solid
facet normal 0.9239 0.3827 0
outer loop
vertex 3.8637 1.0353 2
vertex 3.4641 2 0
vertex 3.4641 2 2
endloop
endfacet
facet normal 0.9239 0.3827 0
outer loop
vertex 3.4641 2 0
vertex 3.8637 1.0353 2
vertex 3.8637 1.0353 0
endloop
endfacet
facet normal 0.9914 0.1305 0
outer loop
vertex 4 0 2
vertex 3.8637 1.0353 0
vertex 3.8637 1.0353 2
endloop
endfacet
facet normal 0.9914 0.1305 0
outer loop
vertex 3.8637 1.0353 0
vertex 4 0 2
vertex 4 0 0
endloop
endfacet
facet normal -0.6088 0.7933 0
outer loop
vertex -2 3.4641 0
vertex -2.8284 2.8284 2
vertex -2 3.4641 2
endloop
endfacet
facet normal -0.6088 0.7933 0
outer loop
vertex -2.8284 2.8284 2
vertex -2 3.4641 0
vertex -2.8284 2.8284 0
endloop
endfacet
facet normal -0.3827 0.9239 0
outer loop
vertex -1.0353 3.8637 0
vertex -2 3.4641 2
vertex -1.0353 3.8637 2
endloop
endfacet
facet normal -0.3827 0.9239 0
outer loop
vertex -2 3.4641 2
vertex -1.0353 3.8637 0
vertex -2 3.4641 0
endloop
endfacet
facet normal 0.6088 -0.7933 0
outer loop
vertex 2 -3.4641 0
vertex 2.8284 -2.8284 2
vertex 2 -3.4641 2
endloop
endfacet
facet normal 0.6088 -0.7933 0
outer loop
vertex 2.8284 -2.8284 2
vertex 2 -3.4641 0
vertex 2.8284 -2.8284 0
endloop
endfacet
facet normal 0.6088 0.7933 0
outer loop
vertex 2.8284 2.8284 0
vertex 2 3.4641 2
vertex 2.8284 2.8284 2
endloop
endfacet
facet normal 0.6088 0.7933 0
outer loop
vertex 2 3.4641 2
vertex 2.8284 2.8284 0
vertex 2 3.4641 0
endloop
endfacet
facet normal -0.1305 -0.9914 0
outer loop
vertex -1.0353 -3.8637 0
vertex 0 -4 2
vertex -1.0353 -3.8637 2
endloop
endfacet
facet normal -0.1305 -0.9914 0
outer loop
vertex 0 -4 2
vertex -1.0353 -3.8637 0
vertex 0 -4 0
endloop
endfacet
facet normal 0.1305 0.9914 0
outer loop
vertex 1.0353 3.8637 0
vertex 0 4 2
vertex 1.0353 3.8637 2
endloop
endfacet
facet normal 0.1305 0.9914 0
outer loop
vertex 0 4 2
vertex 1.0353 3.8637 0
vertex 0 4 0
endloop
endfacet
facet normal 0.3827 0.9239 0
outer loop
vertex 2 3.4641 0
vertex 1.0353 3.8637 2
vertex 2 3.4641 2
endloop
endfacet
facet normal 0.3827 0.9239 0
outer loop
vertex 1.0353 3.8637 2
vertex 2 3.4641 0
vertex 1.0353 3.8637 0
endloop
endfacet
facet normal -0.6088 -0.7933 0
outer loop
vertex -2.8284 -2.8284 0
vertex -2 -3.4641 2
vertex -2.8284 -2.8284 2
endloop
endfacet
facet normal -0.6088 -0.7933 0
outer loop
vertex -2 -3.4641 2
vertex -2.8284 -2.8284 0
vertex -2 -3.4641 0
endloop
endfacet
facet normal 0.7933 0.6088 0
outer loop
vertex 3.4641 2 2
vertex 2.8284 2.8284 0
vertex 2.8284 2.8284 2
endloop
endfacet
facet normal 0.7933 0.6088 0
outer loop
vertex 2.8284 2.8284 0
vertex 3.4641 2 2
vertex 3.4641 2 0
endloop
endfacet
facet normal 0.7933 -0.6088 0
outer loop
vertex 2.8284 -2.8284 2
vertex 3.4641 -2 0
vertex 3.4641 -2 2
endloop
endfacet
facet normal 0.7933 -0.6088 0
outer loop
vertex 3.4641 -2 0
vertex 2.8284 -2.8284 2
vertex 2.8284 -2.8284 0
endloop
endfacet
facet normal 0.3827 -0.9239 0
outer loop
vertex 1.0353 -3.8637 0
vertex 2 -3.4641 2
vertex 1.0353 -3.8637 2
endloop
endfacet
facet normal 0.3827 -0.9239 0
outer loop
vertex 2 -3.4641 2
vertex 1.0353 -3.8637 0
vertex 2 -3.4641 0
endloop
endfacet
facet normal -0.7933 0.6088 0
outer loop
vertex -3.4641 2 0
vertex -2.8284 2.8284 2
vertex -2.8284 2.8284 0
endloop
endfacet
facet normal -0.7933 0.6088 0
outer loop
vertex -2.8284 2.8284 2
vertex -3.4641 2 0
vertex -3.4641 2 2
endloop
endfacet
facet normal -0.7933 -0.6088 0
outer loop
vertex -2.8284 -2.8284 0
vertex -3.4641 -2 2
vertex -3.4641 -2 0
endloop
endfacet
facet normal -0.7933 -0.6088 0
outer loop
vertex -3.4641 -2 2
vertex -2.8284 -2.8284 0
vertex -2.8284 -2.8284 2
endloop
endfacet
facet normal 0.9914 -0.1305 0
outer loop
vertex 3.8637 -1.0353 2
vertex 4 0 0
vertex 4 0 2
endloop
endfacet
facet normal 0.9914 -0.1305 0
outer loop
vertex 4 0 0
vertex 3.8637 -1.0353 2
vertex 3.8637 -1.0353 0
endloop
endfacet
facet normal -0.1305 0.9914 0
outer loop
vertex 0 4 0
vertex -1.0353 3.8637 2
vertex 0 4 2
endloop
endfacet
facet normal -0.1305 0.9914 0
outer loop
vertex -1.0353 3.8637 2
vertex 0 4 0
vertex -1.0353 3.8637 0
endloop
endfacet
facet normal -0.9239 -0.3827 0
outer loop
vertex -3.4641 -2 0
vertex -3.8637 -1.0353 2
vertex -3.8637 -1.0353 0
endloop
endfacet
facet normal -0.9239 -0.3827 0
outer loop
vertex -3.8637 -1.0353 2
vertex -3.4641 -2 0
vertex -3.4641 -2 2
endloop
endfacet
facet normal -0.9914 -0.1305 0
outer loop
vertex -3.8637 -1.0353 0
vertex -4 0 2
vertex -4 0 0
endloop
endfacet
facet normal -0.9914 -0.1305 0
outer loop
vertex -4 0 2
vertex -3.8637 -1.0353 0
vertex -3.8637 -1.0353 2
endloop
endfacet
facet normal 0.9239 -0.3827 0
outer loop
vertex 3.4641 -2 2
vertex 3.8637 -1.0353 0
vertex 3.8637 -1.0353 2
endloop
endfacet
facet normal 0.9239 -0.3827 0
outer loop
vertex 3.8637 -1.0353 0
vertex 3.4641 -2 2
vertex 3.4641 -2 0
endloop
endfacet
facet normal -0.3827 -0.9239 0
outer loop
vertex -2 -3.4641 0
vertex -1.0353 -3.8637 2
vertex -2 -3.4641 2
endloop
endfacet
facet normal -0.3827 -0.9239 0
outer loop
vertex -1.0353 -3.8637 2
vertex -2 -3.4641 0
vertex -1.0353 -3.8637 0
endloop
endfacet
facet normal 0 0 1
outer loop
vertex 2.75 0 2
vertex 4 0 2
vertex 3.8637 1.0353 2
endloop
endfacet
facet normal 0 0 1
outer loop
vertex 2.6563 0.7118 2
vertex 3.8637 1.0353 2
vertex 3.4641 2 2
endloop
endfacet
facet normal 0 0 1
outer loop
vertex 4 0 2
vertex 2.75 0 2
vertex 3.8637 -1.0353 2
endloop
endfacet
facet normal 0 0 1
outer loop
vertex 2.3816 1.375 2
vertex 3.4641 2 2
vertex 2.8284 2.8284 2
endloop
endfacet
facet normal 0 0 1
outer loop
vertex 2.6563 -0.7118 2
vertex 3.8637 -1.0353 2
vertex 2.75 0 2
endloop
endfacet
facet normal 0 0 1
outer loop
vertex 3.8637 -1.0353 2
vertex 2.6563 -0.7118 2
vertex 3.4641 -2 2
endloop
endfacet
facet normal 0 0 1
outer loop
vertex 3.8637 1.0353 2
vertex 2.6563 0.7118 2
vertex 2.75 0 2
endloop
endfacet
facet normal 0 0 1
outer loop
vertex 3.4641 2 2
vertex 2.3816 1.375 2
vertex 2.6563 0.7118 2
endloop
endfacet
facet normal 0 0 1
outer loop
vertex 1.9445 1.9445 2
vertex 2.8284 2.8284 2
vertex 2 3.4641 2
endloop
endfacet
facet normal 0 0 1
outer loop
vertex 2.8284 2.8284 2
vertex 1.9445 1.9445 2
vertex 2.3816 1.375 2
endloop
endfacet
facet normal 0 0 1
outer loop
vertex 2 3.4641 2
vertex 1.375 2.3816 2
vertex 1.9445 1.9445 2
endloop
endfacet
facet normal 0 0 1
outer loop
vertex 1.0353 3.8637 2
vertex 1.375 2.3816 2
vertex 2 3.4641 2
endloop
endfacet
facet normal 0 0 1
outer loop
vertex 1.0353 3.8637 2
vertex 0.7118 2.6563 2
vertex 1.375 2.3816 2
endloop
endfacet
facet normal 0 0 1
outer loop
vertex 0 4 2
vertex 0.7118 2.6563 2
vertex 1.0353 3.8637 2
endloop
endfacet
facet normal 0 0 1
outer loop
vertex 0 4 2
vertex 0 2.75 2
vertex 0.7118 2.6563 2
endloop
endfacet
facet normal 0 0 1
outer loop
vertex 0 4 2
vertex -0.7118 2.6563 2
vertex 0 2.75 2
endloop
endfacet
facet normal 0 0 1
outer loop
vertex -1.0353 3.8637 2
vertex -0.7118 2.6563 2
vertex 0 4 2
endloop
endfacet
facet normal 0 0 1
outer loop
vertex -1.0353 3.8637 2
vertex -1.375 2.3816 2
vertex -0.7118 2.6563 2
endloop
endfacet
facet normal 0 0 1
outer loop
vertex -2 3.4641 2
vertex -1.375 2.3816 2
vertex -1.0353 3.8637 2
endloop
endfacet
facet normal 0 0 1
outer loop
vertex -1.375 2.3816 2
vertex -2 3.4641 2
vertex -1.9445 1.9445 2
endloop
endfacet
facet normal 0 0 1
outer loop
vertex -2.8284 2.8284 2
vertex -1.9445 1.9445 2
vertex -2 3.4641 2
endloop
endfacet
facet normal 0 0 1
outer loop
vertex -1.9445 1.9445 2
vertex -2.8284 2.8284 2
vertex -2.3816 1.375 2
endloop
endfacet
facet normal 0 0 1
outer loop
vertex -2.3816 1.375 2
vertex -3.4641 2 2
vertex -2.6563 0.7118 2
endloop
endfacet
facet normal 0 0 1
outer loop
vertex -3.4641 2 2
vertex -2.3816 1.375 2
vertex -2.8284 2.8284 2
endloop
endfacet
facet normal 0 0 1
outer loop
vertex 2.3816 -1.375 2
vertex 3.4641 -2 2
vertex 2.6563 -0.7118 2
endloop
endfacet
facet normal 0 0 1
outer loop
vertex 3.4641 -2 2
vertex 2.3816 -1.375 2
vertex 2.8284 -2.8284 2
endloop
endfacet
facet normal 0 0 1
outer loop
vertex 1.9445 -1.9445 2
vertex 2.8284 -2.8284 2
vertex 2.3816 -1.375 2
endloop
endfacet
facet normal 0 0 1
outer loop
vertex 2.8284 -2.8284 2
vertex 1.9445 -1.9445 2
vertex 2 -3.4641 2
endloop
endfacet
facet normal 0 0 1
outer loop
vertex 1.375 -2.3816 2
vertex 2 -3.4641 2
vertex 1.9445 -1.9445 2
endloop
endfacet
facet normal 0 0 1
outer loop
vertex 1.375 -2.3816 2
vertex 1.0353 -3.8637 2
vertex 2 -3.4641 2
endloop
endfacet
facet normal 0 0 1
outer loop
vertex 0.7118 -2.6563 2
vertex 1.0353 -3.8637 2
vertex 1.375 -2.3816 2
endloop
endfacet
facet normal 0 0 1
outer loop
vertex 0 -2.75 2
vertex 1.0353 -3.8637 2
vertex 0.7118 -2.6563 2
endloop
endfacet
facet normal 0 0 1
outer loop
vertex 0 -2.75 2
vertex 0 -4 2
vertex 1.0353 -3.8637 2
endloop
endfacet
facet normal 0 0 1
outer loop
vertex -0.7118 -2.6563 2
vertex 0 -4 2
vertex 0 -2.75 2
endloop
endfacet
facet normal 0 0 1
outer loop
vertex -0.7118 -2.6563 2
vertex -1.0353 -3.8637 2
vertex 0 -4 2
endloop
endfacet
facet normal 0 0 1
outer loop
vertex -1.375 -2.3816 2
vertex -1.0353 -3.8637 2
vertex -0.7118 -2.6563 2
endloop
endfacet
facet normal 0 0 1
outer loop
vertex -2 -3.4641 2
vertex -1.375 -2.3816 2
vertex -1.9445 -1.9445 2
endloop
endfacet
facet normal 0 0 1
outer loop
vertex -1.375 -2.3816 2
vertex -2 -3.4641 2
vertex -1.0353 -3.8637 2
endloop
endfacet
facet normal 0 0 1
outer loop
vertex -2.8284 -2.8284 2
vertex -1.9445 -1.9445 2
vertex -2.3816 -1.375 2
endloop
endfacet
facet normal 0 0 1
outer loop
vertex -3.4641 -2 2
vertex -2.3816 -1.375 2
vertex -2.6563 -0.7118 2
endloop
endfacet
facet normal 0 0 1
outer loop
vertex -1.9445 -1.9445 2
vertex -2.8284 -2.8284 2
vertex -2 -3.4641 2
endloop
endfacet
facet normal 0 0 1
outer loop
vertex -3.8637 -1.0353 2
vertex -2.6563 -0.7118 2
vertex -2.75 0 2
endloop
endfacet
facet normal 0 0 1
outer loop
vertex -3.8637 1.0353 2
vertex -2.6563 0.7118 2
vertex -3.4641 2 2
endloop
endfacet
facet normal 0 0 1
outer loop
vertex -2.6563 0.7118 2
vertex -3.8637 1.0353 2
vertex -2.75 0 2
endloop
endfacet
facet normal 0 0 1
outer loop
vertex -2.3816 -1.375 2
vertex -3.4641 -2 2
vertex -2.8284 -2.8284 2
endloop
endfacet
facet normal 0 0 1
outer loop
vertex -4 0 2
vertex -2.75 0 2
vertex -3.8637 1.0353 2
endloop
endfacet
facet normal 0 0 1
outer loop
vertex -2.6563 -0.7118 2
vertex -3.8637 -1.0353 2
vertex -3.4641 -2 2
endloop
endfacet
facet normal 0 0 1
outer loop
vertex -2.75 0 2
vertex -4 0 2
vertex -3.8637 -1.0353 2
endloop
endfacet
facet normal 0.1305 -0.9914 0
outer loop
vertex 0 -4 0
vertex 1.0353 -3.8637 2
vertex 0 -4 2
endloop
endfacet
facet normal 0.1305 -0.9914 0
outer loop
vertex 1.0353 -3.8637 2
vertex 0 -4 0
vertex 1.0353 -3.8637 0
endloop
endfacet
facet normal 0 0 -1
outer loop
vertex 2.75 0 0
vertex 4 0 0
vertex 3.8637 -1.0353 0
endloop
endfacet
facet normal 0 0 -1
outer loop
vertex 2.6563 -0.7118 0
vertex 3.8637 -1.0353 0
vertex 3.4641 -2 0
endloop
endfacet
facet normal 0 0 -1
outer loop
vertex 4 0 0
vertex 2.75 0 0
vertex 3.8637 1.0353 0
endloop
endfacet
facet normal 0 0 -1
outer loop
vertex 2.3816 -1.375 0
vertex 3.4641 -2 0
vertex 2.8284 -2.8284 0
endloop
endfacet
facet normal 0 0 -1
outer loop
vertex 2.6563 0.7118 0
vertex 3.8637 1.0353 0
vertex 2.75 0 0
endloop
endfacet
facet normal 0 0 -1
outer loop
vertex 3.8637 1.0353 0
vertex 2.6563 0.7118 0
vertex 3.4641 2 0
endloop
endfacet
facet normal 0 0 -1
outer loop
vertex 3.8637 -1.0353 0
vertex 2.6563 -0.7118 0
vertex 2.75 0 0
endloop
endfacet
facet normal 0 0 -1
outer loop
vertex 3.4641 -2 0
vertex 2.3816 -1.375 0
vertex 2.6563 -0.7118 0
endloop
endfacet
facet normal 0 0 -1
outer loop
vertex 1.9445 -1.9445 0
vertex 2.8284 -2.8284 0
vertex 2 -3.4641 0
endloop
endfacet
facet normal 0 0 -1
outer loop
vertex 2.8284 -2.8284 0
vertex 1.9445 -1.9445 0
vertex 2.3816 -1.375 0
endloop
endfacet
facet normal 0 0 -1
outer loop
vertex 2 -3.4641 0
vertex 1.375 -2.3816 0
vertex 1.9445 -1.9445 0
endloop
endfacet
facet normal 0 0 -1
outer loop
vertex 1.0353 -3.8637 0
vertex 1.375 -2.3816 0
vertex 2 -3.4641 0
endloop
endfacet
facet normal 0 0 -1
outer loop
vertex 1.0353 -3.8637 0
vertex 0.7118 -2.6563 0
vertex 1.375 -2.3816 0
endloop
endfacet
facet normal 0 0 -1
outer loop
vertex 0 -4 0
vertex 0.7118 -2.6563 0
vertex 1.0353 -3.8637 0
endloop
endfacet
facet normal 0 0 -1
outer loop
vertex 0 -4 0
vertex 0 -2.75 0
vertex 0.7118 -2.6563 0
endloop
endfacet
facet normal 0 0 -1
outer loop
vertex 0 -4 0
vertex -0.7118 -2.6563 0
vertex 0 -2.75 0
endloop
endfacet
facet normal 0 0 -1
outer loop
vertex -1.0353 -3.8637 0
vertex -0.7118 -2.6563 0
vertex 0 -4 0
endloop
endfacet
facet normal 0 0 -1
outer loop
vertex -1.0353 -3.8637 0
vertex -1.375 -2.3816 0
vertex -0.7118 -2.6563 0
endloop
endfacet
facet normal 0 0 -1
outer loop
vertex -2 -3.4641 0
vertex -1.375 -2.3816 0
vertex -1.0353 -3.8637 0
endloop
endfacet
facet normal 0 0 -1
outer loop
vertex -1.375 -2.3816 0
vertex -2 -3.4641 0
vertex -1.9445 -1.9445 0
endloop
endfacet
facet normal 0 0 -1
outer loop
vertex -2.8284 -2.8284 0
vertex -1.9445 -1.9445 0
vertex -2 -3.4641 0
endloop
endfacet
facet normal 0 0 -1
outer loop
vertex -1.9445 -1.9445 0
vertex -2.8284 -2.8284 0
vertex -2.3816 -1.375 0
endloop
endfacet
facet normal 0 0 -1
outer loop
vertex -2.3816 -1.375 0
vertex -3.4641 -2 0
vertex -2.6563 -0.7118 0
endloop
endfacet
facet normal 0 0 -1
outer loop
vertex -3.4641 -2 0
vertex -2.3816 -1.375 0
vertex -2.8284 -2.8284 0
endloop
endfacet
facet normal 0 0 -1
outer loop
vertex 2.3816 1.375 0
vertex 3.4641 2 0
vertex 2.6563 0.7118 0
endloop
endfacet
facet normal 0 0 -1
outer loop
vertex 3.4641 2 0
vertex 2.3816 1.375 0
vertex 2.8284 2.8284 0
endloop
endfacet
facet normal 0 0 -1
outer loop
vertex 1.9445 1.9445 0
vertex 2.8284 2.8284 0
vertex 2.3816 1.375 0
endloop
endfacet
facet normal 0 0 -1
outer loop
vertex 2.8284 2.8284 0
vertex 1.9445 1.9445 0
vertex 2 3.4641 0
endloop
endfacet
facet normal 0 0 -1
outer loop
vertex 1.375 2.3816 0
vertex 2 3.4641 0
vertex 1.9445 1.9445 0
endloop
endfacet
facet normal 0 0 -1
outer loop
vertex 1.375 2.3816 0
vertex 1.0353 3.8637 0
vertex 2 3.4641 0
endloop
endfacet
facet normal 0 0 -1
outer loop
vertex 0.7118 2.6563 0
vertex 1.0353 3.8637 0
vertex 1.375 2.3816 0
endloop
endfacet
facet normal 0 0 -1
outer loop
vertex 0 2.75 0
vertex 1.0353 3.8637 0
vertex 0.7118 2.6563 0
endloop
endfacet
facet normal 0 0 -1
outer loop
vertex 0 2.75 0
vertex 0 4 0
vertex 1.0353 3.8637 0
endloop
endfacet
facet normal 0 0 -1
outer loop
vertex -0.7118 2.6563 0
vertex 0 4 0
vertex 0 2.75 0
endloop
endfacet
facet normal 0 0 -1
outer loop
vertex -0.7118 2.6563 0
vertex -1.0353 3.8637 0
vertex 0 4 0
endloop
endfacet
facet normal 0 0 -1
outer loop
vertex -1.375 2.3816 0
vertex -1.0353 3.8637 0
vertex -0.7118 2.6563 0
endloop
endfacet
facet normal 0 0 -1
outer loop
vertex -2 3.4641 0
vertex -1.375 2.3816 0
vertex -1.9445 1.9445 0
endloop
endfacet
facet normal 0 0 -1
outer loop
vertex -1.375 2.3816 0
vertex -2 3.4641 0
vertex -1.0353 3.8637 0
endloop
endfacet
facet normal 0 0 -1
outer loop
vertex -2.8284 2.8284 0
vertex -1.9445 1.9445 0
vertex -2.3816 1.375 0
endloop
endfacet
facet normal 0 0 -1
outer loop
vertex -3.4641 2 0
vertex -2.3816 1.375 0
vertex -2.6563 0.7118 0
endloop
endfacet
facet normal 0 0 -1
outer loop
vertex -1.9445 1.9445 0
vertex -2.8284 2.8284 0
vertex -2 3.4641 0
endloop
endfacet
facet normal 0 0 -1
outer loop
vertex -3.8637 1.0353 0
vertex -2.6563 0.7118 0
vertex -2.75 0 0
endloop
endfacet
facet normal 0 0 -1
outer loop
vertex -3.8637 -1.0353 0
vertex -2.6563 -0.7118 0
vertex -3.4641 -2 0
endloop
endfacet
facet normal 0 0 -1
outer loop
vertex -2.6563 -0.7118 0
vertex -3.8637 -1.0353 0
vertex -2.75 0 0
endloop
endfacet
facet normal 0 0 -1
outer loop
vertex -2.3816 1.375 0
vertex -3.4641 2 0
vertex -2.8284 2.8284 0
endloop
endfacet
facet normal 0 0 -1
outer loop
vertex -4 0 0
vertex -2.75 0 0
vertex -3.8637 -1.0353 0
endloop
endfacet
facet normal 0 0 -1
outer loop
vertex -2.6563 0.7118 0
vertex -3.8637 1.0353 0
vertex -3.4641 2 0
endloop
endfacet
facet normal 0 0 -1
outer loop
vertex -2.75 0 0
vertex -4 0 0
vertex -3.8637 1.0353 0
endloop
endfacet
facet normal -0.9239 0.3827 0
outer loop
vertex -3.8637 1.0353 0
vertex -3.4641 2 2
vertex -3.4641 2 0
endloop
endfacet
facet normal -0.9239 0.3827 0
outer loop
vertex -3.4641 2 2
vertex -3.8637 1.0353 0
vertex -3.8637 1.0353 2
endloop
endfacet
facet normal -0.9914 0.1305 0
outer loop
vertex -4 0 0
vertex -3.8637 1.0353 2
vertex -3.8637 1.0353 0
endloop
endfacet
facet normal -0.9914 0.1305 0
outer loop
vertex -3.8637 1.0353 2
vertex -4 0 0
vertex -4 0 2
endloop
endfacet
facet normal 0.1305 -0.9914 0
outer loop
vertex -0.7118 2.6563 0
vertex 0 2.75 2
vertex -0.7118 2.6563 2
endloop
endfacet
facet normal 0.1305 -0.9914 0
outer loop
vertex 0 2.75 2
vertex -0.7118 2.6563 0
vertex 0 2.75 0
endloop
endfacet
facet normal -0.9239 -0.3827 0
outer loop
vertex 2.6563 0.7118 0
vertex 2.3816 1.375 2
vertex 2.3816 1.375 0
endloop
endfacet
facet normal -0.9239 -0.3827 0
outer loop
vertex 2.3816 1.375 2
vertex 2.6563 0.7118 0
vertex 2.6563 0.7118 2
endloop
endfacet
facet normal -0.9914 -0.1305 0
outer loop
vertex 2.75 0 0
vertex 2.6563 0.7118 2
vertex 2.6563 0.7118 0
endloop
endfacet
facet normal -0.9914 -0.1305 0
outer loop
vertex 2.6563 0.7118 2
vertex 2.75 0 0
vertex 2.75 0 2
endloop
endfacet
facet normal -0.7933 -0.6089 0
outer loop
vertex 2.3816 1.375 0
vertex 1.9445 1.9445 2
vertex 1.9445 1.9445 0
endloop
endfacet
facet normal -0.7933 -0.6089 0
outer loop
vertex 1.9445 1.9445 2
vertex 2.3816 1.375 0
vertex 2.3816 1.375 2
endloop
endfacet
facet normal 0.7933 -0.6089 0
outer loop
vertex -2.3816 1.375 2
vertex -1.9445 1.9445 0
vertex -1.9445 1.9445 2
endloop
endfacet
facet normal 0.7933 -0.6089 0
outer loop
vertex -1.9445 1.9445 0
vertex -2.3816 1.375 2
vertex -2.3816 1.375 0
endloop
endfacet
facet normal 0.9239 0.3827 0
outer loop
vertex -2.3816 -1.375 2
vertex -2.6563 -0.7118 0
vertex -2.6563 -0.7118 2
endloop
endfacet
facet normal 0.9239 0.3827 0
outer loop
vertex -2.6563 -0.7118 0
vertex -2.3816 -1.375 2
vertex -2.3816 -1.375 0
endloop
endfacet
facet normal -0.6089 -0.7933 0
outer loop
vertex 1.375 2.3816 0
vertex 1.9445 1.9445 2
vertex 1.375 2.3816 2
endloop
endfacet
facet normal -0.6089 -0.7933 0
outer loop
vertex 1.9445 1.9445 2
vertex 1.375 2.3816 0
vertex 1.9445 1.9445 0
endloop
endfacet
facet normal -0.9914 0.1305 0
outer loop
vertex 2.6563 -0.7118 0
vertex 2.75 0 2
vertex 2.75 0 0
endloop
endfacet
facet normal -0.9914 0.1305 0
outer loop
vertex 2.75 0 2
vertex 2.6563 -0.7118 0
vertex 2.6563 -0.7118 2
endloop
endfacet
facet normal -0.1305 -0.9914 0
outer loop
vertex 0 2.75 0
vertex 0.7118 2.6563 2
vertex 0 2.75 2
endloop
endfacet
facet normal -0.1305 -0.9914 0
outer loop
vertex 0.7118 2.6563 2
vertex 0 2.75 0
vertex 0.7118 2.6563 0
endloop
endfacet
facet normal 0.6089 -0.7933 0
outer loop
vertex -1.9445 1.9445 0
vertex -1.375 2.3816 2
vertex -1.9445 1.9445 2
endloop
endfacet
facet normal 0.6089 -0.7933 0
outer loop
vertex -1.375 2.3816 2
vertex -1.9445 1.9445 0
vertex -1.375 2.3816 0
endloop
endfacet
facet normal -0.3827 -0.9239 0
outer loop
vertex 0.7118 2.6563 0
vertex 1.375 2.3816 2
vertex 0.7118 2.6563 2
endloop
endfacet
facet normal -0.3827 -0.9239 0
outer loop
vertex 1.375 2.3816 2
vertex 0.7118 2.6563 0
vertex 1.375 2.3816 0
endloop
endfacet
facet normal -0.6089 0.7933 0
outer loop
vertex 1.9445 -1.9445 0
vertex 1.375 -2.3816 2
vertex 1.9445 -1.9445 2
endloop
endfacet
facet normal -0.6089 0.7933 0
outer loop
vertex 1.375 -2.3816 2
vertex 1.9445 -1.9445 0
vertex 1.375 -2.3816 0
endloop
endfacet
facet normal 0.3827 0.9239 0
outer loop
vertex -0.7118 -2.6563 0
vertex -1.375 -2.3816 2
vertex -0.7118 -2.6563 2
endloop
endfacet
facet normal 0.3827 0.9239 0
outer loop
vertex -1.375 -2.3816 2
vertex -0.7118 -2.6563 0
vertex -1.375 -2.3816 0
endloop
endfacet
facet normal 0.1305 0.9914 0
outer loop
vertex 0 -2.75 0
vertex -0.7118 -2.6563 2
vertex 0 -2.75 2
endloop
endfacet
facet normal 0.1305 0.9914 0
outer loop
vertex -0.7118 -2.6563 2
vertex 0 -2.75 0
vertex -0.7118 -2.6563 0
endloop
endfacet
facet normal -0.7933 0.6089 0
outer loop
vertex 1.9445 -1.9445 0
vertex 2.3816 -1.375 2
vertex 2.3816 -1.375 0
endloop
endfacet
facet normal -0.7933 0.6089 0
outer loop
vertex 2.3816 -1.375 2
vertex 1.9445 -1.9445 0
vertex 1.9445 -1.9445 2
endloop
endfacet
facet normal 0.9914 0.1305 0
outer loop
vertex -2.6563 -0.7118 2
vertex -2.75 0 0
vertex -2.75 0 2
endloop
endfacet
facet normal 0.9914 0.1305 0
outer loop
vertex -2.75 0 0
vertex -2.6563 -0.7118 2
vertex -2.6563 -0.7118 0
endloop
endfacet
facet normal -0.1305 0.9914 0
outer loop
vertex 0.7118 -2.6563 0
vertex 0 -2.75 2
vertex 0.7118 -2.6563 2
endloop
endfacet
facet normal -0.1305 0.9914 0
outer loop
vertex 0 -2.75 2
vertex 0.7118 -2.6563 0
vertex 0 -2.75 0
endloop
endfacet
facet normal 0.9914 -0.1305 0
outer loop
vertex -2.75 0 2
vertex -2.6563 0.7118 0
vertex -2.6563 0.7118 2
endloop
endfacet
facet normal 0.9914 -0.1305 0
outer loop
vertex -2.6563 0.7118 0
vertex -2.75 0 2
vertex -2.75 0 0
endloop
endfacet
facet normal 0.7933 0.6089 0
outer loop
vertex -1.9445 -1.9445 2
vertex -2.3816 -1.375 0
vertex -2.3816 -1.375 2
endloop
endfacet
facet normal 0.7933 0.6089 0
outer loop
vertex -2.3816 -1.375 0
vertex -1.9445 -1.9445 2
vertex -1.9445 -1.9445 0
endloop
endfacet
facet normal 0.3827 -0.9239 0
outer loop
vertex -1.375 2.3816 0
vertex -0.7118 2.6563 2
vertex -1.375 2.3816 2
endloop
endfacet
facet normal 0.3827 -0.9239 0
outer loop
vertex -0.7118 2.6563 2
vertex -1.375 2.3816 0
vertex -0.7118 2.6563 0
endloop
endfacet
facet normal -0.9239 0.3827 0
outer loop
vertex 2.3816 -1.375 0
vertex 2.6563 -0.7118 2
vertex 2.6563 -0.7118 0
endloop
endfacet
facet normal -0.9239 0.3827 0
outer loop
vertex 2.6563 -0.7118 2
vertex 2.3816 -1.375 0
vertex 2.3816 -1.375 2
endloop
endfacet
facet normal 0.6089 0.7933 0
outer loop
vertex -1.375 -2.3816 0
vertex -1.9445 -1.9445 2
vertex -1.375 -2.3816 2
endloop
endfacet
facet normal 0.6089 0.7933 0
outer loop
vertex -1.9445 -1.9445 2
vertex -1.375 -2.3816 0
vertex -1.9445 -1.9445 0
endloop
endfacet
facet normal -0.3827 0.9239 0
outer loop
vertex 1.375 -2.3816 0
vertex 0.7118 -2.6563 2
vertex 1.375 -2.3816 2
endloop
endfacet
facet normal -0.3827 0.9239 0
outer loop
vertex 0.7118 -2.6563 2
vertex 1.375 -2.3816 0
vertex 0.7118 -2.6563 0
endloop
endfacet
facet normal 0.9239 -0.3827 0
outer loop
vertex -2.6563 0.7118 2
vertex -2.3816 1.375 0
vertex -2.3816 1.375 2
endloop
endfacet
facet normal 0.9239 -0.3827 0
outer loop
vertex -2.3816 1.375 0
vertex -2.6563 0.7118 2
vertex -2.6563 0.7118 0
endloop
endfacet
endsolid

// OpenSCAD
INSIDE_DIAMETER = 5.5; // [1:0.1:10]
OUTSIDE_DIAMETER = 8; // [1:0.1:10]
HEIGHT = 2; // [1:0.1:10]

$fn     = 24 + 0;

difference() {
	cylinder(d = OUTSIDE_DIAMETER, h = HEIGHT);

	translate([0, 0, -1])
		cylinder(d = INSIDE_DIAMETER, h = HEIGHT+2);
}
